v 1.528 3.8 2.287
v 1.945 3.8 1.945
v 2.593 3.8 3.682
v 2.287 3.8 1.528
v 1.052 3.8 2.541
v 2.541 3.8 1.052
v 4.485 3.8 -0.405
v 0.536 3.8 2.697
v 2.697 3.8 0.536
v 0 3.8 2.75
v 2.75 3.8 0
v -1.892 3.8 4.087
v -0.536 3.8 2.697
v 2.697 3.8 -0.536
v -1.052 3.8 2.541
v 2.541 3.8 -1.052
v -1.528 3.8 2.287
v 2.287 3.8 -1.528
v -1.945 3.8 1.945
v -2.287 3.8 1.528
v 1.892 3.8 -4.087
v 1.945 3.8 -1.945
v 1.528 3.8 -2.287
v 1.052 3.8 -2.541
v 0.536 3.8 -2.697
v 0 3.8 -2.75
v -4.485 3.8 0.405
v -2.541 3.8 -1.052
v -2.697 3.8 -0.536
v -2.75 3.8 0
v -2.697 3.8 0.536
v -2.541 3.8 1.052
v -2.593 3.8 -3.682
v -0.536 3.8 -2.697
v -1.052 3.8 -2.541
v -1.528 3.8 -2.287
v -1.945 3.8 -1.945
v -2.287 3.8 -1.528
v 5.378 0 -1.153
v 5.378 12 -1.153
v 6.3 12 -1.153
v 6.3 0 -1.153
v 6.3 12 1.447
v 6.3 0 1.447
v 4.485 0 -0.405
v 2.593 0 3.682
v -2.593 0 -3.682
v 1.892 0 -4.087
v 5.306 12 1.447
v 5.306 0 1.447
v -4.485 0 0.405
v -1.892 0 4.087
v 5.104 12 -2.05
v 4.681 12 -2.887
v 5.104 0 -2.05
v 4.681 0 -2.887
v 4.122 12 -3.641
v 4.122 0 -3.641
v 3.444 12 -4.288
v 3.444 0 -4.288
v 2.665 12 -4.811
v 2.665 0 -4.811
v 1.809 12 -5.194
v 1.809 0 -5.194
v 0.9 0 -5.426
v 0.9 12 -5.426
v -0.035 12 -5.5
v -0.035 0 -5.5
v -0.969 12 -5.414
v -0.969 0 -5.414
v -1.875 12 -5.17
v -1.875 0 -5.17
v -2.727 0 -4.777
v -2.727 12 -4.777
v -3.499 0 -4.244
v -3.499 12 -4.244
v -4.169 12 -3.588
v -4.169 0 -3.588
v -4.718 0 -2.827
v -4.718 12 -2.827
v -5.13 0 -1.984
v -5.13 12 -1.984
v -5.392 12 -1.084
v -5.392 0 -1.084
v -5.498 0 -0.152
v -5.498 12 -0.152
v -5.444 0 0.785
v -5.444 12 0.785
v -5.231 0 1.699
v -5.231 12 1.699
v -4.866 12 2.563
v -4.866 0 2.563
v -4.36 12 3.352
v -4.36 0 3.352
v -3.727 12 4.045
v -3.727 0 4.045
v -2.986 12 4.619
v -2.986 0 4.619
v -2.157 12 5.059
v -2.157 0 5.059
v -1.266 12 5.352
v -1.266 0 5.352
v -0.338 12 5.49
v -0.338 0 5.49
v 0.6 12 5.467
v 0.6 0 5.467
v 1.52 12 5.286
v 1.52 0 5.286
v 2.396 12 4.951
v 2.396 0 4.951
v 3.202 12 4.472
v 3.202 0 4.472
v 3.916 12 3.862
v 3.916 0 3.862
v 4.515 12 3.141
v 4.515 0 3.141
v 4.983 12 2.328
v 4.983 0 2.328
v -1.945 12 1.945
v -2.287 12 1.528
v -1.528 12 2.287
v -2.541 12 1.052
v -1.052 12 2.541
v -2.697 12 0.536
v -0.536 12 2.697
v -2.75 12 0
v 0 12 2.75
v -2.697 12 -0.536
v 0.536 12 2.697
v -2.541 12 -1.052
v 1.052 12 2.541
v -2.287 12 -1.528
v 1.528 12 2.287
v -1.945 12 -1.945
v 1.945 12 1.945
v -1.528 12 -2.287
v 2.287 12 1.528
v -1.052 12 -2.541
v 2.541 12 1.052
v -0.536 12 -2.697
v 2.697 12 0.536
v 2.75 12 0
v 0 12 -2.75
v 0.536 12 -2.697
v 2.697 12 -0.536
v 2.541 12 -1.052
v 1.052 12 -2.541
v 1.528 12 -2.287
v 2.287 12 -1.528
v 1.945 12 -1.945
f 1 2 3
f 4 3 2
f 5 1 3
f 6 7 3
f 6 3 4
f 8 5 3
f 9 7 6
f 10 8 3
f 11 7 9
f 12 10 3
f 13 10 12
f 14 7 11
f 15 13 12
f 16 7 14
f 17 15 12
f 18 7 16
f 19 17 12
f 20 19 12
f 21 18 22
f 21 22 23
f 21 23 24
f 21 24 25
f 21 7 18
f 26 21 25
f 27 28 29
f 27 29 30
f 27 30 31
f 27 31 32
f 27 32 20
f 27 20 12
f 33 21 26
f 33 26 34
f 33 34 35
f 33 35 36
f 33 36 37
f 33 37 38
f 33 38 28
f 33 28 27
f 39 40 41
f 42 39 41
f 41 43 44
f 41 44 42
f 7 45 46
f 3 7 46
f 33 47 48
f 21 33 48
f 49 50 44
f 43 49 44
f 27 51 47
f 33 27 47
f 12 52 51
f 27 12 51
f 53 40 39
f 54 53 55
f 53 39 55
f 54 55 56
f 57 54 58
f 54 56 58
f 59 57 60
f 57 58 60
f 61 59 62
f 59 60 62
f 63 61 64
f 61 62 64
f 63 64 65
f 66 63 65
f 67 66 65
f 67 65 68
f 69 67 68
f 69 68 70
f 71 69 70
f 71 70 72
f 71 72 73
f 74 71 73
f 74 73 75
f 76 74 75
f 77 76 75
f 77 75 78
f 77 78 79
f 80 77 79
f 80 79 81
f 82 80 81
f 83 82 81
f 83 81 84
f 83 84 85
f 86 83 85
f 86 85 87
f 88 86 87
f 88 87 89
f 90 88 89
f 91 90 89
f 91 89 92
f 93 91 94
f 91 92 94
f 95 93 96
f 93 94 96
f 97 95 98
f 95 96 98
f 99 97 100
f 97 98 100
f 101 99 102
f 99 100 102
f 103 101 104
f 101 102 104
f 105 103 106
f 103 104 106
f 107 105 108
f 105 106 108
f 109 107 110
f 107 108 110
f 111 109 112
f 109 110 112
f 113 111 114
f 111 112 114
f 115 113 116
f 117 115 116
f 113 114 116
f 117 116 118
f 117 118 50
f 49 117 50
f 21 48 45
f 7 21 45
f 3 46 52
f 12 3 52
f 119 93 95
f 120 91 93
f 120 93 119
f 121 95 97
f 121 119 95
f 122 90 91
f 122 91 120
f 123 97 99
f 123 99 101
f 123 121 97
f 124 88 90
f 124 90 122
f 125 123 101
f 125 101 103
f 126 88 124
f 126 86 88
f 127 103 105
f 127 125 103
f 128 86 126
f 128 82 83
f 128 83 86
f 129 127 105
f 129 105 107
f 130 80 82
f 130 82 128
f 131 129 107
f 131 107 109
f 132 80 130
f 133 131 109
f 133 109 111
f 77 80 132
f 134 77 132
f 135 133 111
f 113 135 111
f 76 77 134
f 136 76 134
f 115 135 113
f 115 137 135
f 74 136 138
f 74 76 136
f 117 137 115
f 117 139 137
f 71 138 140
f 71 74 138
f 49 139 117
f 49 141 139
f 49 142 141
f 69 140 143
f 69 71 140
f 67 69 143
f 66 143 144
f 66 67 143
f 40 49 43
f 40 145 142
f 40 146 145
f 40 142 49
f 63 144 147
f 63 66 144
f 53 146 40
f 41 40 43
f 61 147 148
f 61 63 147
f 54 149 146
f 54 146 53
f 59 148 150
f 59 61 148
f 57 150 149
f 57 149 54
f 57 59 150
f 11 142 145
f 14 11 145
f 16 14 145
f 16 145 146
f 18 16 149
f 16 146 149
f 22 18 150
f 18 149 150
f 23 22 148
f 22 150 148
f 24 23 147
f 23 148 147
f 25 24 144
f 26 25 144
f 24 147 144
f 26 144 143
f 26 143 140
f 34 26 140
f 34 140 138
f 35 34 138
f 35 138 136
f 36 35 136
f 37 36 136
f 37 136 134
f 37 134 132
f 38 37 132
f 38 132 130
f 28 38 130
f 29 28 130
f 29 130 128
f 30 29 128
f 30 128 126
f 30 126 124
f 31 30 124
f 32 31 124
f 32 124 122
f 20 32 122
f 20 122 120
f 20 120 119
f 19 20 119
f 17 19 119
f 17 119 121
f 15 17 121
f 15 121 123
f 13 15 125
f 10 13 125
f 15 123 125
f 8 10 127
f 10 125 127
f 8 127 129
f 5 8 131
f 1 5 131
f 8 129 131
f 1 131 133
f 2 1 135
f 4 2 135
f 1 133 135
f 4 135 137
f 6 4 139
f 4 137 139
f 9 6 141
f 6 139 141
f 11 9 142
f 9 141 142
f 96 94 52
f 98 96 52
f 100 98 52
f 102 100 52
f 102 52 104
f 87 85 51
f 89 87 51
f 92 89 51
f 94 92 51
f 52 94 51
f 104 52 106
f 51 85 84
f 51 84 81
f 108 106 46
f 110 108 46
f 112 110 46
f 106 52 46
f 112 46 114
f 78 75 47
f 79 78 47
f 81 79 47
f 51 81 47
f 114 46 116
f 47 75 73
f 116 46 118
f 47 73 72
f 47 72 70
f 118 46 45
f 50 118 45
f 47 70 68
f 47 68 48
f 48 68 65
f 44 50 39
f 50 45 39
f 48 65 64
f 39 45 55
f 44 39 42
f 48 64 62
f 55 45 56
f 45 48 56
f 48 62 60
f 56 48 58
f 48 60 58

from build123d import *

# Parameters (mm, degrees)
SKETCH1_R           = 5.5
BOSS_EXTRUDE1_DEPTH = 12
SKETCH2_W           = 3
SKETCH2_H           = 2.6
BOSS_EXTRUDE2_DEPTH = 12
CUT_EXTRUDE1_DEPTH  = 3.8
SKETCH5_R           = 2.75
CUT_EXTRUDE3_DEPTH  = 17.65


with BuildPart() as part:
    # Sketch1 → Boss-Extrude1 (new body)
    with BuildSketch(Plane(origin=(0, 0, 0), x_dir=(1, 0, 0), z_dir=(0, 1, 0))):
        Circle(SKETCH1_R)
    extrude(amount=BOSS_EXTRUDE1_DEPTH)

    # Sketch2 → Boss-Extrude2 (add)
    with BuildSketch(Plane(origin=(0, 12, 0), x_dir=(1, 0, 0), z_dir=(0, 1, 0))):
        with Locations((4.8, -0.147270773)):
            Rectangle(SKETCH2_W, SKETCH2_H)
    extrude(amount=-BOSS_EXTRUDE2_DEPTH)

    # Sketch3 → Cut-Extrude1 (cut)
    with BuildSketch(Plane(origin=(0, 0, 0), x_dir=(-1, 0, 0), z_dir=(0, -1, 0))):
        Polygon((-1.891599986, 4.086789631), (-4.485063634, 0.405221174), (-2.593463648, -3.681568458), (1.891599986, -4.086789631), (4.485063634, -0.405221174), (2.593463648, 3.681568458), align=None)
    extrude(amount=-CUT_EXTRUDE1_DEPTH, mode=Mode.SUBTRACT)

    # Sketch5 → Cut-Extrude3 (cut)
    with BuildSketch(Plane(origin=(0, 12, 0), x_dir=(1, 0, 0), z_dir=(0, 1, 0))):
        Circle(SKETCH5_R)
    extrude(amount=-CUT_EXTRUDE3_DEPTH, mode=Mode.SUBTRACT)


solid = part.part
